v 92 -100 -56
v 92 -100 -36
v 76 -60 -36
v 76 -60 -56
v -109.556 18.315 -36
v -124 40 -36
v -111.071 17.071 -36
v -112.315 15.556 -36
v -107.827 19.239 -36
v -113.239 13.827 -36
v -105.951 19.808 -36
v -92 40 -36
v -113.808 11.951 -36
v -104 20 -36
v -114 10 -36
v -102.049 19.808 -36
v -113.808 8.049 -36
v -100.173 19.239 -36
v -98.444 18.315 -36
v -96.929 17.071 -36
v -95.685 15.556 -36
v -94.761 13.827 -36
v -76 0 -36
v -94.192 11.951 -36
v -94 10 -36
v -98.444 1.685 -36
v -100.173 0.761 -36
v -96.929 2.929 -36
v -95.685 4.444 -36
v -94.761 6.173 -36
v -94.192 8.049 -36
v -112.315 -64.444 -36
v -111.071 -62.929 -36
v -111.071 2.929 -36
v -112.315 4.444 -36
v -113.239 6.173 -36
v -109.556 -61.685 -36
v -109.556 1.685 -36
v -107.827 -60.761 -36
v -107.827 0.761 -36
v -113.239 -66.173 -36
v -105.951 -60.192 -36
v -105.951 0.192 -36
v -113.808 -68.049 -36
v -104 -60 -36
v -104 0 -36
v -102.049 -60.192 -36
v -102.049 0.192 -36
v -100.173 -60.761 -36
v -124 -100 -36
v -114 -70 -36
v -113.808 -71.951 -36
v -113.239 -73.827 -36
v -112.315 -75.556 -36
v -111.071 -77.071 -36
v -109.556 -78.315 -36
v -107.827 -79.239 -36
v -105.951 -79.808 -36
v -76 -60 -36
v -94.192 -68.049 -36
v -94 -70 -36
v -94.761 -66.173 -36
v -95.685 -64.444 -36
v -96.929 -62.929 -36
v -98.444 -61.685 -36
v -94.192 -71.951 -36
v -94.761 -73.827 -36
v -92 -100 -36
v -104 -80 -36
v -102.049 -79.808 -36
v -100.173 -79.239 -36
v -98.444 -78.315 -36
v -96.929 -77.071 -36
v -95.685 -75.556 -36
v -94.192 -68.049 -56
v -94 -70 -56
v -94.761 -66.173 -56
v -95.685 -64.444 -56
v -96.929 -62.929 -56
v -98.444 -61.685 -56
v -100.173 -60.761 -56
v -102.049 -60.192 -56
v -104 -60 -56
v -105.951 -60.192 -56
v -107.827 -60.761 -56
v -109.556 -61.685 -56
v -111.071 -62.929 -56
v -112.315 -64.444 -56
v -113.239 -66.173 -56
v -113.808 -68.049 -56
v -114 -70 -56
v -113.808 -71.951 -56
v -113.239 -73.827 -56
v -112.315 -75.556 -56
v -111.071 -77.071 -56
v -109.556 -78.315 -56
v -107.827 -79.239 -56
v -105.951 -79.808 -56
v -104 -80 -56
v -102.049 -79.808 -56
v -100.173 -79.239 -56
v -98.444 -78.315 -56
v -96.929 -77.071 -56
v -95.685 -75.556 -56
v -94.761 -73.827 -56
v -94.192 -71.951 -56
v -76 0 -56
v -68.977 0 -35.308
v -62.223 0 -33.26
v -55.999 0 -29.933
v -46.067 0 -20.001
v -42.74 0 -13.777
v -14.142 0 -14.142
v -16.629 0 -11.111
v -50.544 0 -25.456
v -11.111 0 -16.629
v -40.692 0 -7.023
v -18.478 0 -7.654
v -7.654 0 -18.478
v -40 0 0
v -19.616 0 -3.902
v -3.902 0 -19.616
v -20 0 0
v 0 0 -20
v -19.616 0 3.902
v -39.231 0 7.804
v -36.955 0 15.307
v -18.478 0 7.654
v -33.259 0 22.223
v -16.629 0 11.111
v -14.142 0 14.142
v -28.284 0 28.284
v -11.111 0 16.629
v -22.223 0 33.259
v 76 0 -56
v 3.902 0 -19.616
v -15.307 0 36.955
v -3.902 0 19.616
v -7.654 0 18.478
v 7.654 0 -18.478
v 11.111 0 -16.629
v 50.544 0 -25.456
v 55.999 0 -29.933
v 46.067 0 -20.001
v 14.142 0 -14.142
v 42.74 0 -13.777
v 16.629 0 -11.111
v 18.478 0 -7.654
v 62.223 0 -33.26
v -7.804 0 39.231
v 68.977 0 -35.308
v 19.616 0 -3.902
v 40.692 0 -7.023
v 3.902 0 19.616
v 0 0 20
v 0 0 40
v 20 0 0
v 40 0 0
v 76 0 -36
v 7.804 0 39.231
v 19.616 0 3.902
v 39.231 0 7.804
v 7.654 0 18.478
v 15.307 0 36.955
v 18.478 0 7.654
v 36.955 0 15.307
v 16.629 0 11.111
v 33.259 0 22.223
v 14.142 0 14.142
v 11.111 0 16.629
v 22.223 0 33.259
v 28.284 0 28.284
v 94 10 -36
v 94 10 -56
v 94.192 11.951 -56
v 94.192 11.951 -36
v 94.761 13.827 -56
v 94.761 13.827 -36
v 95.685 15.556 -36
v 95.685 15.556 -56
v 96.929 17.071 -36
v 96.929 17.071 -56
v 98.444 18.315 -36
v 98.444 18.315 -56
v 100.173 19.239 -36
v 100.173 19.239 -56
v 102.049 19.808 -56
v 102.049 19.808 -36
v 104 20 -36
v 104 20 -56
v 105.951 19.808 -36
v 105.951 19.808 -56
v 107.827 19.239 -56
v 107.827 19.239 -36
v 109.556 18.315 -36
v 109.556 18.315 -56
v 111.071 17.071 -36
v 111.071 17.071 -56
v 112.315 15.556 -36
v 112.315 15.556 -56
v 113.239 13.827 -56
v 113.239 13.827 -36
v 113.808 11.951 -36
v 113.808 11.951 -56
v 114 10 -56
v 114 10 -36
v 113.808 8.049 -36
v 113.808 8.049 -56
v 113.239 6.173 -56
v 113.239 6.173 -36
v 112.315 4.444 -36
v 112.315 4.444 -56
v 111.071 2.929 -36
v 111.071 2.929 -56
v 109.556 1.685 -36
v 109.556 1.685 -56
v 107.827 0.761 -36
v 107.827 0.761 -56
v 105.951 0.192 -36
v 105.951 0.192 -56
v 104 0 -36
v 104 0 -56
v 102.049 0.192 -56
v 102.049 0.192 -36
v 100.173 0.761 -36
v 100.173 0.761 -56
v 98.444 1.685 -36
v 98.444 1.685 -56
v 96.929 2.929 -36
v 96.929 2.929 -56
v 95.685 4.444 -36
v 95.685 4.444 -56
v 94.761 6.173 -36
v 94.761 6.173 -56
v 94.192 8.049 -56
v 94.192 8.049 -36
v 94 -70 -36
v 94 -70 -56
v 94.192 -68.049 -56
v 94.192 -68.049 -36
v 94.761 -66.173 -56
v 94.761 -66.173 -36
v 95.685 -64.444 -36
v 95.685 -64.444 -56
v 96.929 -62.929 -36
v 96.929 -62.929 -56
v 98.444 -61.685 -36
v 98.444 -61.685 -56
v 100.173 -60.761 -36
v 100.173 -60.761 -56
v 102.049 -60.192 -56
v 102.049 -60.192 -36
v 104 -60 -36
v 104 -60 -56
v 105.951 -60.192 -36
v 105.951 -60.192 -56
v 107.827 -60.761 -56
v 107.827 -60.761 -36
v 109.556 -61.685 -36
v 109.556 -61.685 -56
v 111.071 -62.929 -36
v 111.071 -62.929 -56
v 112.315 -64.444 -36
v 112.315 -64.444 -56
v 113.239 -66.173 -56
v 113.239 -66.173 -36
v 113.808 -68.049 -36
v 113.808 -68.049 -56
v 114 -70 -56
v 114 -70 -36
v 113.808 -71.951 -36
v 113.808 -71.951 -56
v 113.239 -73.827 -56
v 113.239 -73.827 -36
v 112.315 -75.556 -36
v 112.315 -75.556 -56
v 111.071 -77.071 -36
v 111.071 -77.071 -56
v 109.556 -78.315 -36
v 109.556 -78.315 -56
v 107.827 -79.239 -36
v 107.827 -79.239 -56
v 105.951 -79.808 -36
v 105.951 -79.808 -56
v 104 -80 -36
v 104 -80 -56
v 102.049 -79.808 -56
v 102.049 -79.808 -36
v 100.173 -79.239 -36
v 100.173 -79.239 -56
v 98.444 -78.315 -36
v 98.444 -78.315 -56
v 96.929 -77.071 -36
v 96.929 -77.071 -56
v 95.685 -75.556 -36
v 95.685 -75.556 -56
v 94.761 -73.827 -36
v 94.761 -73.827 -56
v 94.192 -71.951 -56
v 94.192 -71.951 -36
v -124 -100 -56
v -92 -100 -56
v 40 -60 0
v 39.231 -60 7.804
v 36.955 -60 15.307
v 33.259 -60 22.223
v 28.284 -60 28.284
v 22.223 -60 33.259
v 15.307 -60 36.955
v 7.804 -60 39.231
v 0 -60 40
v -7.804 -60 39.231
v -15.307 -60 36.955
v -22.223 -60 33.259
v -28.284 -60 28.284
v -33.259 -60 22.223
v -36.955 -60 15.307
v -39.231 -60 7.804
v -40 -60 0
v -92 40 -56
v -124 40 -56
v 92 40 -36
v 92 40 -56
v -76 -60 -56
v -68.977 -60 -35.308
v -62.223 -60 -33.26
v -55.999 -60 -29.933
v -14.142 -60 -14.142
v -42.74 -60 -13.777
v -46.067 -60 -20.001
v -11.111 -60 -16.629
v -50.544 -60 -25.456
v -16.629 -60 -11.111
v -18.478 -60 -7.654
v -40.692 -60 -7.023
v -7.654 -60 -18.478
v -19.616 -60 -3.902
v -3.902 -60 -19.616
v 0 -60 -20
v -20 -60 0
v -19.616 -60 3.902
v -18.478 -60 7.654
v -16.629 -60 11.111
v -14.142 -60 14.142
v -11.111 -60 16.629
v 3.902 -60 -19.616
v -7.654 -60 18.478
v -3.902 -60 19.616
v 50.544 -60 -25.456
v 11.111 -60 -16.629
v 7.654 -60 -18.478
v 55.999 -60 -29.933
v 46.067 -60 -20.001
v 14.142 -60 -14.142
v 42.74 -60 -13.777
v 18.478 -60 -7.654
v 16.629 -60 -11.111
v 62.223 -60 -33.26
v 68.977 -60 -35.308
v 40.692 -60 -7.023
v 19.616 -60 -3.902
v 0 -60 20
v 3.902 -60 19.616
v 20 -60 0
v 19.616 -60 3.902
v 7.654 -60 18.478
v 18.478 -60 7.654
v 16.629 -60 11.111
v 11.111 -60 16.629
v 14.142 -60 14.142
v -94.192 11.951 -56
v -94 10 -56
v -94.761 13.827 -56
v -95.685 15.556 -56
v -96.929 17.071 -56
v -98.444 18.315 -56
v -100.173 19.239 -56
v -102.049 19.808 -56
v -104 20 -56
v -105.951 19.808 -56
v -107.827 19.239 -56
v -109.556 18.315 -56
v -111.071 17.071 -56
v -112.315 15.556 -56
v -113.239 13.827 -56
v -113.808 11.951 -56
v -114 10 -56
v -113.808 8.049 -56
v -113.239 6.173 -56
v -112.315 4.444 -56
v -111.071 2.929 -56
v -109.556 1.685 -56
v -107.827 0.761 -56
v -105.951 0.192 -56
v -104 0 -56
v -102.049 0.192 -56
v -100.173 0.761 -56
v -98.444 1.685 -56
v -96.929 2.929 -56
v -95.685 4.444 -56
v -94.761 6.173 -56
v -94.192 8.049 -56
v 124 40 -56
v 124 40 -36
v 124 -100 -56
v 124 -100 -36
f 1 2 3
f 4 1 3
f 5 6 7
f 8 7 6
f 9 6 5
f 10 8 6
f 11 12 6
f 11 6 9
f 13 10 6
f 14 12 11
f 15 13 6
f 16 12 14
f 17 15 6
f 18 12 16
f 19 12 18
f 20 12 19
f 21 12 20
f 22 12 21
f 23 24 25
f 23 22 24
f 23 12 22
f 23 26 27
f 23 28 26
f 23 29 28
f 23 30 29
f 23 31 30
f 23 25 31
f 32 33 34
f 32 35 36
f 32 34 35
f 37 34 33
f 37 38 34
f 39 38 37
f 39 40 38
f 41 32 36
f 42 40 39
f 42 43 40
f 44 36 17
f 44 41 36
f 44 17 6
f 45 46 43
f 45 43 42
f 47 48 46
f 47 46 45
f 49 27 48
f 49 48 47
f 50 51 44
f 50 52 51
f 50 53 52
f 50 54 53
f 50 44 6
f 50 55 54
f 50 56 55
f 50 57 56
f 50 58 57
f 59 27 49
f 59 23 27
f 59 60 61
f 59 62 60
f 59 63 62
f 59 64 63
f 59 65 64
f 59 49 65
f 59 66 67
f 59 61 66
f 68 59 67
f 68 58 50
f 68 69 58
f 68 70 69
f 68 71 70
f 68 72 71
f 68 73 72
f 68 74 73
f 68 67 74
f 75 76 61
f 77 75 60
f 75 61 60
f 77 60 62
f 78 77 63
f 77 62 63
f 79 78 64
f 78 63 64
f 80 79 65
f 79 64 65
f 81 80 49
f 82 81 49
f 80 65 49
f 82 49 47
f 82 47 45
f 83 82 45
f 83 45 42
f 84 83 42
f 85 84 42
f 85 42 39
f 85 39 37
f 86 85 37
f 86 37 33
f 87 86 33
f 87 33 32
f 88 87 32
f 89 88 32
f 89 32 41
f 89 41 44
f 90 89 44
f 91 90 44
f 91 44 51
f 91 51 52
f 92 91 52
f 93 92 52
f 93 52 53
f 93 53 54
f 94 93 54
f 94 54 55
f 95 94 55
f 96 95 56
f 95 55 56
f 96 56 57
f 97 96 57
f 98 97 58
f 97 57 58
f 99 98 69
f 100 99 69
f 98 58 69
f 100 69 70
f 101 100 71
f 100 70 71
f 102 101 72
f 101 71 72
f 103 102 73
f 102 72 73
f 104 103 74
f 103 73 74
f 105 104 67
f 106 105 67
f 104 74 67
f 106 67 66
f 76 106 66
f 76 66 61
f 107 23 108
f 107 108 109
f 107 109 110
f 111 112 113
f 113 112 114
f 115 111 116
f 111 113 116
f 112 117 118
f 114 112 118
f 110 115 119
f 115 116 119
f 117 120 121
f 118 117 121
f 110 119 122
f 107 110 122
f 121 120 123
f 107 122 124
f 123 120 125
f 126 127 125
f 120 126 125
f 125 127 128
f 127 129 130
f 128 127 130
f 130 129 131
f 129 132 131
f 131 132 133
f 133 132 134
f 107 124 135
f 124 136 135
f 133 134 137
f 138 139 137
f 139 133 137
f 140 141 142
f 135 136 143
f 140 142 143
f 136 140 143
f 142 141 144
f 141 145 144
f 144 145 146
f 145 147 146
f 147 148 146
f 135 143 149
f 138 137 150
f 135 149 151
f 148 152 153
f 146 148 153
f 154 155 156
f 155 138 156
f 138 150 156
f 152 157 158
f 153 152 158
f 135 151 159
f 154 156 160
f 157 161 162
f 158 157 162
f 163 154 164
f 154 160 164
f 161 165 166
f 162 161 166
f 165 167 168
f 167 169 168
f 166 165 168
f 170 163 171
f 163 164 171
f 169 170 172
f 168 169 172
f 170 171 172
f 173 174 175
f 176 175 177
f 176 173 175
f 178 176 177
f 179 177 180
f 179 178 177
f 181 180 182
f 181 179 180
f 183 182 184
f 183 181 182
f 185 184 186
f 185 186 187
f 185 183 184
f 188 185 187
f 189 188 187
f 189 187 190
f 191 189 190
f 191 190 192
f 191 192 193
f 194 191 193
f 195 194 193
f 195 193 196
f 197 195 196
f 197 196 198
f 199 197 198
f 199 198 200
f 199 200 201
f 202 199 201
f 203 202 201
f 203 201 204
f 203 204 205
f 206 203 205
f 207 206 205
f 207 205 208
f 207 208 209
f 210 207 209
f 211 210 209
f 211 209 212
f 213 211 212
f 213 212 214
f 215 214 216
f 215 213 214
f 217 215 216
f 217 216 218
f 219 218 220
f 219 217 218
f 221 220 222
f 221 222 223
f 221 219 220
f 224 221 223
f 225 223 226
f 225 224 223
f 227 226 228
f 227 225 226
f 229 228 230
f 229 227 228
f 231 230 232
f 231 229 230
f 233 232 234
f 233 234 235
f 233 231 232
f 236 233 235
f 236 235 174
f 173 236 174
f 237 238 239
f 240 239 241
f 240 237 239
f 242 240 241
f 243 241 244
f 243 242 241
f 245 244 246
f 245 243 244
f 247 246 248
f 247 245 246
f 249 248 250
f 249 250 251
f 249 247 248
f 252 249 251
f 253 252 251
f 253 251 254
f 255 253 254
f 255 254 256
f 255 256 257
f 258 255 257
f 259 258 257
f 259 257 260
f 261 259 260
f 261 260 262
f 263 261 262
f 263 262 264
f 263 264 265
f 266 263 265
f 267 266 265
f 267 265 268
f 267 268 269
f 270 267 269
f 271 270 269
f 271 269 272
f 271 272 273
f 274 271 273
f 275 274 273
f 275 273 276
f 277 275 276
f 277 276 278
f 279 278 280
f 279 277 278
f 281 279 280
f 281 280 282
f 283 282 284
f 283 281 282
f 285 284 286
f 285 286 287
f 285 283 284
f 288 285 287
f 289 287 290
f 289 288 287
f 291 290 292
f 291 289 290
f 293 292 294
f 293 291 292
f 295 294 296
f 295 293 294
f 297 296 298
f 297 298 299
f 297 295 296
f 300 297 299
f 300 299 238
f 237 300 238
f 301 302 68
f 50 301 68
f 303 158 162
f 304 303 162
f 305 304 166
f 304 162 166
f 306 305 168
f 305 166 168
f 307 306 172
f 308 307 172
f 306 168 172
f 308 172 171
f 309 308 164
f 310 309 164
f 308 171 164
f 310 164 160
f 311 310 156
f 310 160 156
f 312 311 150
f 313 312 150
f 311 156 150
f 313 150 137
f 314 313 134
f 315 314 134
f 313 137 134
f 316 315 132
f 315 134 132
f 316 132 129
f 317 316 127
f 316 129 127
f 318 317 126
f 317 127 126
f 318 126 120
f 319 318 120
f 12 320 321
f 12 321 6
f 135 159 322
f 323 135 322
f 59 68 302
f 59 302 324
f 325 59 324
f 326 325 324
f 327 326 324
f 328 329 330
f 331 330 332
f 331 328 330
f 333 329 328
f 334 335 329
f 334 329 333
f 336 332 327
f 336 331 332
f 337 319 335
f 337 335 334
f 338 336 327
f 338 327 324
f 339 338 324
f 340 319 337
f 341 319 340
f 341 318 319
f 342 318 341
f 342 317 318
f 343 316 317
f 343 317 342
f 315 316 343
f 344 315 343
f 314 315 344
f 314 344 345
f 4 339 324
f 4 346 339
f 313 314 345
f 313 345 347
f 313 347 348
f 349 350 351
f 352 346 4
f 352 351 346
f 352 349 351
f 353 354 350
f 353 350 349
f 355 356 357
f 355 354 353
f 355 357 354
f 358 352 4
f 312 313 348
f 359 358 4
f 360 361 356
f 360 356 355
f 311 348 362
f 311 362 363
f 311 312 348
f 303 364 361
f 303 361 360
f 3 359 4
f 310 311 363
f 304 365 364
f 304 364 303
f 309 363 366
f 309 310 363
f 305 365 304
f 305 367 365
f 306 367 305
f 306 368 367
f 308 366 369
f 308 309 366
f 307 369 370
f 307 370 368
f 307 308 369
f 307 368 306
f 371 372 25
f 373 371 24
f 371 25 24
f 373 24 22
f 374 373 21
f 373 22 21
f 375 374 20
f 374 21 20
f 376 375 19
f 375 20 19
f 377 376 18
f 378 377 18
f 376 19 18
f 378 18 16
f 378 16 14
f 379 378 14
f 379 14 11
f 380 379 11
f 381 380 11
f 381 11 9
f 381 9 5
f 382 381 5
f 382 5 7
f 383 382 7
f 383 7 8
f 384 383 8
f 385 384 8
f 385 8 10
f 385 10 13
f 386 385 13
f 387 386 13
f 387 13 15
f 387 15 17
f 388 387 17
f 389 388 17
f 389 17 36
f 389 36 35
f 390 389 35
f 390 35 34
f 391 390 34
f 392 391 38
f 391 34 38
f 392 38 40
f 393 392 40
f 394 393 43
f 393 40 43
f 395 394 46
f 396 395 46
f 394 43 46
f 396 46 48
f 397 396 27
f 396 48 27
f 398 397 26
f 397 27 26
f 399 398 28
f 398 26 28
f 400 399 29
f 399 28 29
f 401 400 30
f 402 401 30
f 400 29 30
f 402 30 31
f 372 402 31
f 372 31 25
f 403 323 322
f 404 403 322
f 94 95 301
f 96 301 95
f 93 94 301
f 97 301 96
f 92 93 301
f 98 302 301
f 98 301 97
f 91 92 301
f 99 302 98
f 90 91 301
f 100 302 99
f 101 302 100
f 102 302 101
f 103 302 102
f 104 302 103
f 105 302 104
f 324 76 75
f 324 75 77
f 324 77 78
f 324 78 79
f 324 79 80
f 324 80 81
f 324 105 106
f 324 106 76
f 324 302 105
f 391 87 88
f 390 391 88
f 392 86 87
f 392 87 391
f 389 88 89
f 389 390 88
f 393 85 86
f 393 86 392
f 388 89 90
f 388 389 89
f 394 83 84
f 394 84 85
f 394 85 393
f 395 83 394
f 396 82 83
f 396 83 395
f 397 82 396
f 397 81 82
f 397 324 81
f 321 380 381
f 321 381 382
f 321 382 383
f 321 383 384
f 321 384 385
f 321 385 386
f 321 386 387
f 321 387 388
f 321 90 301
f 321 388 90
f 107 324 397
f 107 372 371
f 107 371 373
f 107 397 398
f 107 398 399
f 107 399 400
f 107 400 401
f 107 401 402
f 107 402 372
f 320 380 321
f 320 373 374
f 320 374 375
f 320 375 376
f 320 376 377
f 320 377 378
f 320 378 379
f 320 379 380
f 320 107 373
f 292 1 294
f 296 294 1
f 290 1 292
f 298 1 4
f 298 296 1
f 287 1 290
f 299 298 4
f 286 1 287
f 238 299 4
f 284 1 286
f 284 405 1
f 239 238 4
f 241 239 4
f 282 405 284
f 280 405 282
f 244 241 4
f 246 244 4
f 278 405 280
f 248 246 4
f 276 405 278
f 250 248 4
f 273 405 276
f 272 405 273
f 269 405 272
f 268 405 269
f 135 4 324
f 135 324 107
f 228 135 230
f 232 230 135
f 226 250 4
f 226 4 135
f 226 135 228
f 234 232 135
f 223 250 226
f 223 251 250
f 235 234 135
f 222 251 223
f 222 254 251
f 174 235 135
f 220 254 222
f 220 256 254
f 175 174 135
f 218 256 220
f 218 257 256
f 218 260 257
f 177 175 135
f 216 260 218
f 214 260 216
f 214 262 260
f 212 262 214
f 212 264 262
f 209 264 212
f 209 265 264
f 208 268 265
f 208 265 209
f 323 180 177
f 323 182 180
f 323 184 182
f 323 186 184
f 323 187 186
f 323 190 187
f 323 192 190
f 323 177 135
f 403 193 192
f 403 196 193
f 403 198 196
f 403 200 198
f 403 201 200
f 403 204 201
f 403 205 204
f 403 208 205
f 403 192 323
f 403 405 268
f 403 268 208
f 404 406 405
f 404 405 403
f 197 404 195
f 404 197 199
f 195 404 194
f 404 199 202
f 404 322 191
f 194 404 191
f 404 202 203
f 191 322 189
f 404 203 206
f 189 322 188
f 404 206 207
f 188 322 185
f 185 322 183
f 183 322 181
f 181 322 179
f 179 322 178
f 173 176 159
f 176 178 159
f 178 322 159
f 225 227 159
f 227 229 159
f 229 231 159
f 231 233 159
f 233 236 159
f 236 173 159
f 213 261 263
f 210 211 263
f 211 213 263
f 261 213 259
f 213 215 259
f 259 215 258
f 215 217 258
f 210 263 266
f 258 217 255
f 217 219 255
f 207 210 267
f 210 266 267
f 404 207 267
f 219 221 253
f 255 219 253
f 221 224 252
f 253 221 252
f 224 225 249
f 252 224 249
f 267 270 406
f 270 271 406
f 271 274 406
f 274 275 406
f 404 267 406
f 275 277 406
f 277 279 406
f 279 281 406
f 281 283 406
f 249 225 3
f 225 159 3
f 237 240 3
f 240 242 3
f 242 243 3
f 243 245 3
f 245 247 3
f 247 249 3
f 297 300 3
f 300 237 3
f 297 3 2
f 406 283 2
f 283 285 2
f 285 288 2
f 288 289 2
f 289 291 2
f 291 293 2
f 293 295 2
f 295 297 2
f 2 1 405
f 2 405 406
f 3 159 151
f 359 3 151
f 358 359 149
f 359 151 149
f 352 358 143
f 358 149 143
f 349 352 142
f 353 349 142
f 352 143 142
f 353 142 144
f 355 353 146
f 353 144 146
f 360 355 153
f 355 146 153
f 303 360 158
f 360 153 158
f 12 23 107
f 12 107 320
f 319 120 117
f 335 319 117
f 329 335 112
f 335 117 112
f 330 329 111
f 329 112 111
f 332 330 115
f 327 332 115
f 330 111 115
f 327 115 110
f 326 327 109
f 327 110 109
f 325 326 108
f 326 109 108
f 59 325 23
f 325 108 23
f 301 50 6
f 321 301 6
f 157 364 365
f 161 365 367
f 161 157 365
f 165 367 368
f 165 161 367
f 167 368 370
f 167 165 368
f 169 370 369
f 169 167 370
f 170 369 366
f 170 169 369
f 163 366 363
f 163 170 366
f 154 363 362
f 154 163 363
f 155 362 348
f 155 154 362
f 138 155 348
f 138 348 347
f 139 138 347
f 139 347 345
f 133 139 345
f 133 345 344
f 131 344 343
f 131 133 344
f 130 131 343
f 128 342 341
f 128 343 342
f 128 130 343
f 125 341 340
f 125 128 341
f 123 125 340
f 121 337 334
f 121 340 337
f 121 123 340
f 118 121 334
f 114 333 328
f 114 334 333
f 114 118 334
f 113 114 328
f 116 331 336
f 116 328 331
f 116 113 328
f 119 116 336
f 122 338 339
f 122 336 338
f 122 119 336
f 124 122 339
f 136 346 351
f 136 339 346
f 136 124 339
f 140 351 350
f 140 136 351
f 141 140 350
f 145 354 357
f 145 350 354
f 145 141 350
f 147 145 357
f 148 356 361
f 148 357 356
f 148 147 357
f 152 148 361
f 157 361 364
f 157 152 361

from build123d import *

# Parameters (mm, degrees)
F0_R     = 20
F1_DEPTH = 60
F2_W     = 40
F2_H     = 20
F2_W_2   = 60
F3_DEPTH = 48
F5_DEPTH = 20.001
F7_R     = 10
F8_DEPTH = 20.001


with BuildPart() as f1:
    # F0 (on Front) → F1 (new body)
    with BuildSketch(Plane.XZ):
        with BuildLine():
            ThreePointArc((76, -36), (50.544156, -25.455844), (40, 0))
            ThreePointArc((40, 0), (0, 40), (-40, 0))
            ThreePointArc((-40, 0), (-50.544156, -25.455844), (-76, -36))
            Line((-76, -36), (-76, -56))
            Line((-76, -56), (76, -56))
            Line((76, -56), (76, -36))
        make_face()
        Circle(F0_R, mode=Mode.SUBTRACT)
    extrude(amount=F1_DEPTH)

    # F2 (on face) → F3 (join)
    with BuildSketch(Plane.YZ.offset(76)):
        with Locations((-80, -46)):
            Rectangle(F2_W, F2_H)
        with Locations((20, -46)):
            Rectangle(F2_W, F2_H)
        with Locations((-30, -46)):
            Rectangle(F2_W_2, F2_H)
    extrude(amount=F3_DEPTH)

    # F4 (on face) → F5 (cut, through all)
    with BuildSketch(Plane.XY.offset(-36)):
        Polygon((76, 0), (92, 40), (76, 40), align=None)
        Polygon((76, -100), (92, -100), (76, -60), align=None)
    extrude(amount=-F5_DEPTH, mode=Mode.SUBTRACT)

    # F6: F1 across plane


with BuildPart() as f1_1:
    add(f1.part)
    add(f1.part.mirror(Plane.YZ))

    # F7 (on face) → F8 (cut, through all)
    with BuildSketch(Plane.XY.offset(-36)):
        with Locations((-104, -70)):
            Circle(F7_R)
        with Locations((-104, 10)):
            Circle(F7_R)
    extrude(amount=-F8_DEPTH, mode=Mode.SUBTRACT)

    # F9: F1 across plane


with BuildPart() as f1_2:
    add(f1_1.part)
    add(f1_1.part.mirror(Plane.YZ), mode=Mode.INTERSECT)


solid = f1_2.part
